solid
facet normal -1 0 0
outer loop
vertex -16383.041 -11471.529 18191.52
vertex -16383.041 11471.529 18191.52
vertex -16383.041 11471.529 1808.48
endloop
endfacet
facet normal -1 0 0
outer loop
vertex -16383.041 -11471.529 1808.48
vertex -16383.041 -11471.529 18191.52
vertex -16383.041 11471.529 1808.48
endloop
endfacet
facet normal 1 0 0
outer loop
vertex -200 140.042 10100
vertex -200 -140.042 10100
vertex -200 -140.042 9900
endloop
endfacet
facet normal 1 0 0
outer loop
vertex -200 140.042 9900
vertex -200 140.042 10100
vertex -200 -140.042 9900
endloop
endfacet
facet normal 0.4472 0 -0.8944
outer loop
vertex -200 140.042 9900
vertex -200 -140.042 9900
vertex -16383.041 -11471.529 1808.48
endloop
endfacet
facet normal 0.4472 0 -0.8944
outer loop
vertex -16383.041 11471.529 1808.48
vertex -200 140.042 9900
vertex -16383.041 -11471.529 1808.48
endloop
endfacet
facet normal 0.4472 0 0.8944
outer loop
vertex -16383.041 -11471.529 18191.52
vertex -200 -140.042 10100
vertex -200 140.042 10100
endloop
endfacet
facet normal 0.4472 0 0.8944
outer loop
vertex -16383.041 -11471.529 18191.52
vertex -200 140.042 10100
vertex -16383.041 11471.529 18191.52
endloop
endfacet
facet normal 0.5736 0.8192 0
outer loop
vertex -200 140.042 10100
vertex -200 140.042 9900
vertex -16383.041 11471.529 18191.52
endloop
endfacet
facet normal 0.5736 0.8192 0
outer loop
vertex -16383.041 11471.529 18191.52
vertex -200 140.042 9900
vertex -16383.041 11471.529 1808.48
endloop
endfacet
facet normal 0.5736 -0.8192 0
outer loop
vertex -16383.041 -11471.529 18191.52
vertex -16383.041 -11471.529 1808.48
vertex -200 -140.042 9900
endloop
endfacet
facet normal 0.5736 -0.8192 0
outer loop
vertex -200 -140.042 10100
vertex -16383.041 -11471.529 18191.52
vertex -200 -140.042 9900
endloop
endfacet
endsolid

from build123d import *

# Parameters (mm, degrees)
BOSS_EXTRUDE1_DEPTH     = 20000
CUT_EXTRUDE1_DEPTH      = 30523.057128163
CUT_EXTRUDE1_DEPTH_BACK = 30523.057128163
CUT_EXTRUDE2_DEPTH      = 30523.057128163
CUT_EXTRUDE2_DEPTH_BACK = 30523.057128163
CUT_EXTRUDE3_DEPTH      = 30523.057128163
CUT_EXTRUDE3_DEPTH_BACK = 30523.057128163
CUT_EXTRUDE4_DEPTH      = 30523.057128163
CUT_EXTRUDE4_DEPTH_BACK = 30523.057128163


with BuildPart() as part:
    # Sketch3 → Boss-Extrude1 (new body)
    with BuildSketch(Plane.XY):
        with BuildLine():
            Line((0, 0), (-16383.04088578, 11471.528727021))
            ThreePointArc((-16383.04088578, 11471.528727021), (-20000, 0), (-16383.04088578, -11471.528727021))
            Line((-16383.04088578, -11471.528727021), (0, 0))
        make_face()
    extrude(amount=BOSS_EXTRUDE1_DEPTH)

    # Sketch20 → Cut-Extrude1 (cut, two sides: drawn at the far end of the back side and taken through both)
    with BuildSketch(Plane(origin=(0, 0, 0), x_dir=(1, 0, 0), z_dir=(0, 1, 0)).offset(-CUT_EXTRUDE1_DEPTH_BACK)):
        Polygon((0, -10000), (-20000, -20000), (0, -20000), align=None)
    extrude(amount=CUT_EXTRUDE1_DEPTH + CUT_EXTRUDE1_DEPTH_BACK, mode=Mode.SUBTRACT)

    # Sketch22 → Cut-Extrude2 (cut, two sides: drawn at the far end of the back side and taken through both)
    with BuildSketch(Plane(origin=(0, 0, 0), x_dir=(1, 0, 0), z_dir=(0, 1, 0)).offset(-CUT_EXTRUDE2_DEPTH_BACK)):
        Polygon((0, -10000), (-20000, 0), (0, 0), align=None)
    extrude(amount=CUT_EXTRUDE2_DEPTH + CUT_EXTRUDE2_DEPTH_BACK, mode=Mode.SUBTRACT)

    # Sketch23 → Cut-Extrude3 (cut, two sides: drawn at the far end of the back side and taken through both)
    with BuildSketch(Plane(origin=(0, 0, 0), x_dir=(1, 0, 0), z_dir=(0, 1, 0)).offset(-CUT_EXTRUDE3_DEPTH_BACK)):
        Polygon((-200, -10100), (-200, -9900), (0, -10000), align=None)
    extrude(amount=CUT_EXTRUDE3_DEPTH + CUT_EXTRUDE3_DEPTH_BACK, mode=Mode.SUBTRACT)

    # Sketch24 → Cut-Extrude4 (cut, two sides: drawn at the far end of the back side and taken through both)
    with BuildSketch(Plane(origin=(0, 0, 0), x_dir=(1, 0, 0), z_dir=(0, 1, 0)).offset(-CUT_EXTRUDE4_DEPTH_BACK)):
        Polygon((-16383.04088578, -18191.52044289), (-16383.04088578, -1808.47955711), (-20000, 0), (-20000, -20000), align=None)
    extrude(amount=CUT_EXTRUDE4_DEPTH + CUT_EXTRUDE4_DEPTH_BACK, mode=Mode.SUBTRACT)


solid = part.part
